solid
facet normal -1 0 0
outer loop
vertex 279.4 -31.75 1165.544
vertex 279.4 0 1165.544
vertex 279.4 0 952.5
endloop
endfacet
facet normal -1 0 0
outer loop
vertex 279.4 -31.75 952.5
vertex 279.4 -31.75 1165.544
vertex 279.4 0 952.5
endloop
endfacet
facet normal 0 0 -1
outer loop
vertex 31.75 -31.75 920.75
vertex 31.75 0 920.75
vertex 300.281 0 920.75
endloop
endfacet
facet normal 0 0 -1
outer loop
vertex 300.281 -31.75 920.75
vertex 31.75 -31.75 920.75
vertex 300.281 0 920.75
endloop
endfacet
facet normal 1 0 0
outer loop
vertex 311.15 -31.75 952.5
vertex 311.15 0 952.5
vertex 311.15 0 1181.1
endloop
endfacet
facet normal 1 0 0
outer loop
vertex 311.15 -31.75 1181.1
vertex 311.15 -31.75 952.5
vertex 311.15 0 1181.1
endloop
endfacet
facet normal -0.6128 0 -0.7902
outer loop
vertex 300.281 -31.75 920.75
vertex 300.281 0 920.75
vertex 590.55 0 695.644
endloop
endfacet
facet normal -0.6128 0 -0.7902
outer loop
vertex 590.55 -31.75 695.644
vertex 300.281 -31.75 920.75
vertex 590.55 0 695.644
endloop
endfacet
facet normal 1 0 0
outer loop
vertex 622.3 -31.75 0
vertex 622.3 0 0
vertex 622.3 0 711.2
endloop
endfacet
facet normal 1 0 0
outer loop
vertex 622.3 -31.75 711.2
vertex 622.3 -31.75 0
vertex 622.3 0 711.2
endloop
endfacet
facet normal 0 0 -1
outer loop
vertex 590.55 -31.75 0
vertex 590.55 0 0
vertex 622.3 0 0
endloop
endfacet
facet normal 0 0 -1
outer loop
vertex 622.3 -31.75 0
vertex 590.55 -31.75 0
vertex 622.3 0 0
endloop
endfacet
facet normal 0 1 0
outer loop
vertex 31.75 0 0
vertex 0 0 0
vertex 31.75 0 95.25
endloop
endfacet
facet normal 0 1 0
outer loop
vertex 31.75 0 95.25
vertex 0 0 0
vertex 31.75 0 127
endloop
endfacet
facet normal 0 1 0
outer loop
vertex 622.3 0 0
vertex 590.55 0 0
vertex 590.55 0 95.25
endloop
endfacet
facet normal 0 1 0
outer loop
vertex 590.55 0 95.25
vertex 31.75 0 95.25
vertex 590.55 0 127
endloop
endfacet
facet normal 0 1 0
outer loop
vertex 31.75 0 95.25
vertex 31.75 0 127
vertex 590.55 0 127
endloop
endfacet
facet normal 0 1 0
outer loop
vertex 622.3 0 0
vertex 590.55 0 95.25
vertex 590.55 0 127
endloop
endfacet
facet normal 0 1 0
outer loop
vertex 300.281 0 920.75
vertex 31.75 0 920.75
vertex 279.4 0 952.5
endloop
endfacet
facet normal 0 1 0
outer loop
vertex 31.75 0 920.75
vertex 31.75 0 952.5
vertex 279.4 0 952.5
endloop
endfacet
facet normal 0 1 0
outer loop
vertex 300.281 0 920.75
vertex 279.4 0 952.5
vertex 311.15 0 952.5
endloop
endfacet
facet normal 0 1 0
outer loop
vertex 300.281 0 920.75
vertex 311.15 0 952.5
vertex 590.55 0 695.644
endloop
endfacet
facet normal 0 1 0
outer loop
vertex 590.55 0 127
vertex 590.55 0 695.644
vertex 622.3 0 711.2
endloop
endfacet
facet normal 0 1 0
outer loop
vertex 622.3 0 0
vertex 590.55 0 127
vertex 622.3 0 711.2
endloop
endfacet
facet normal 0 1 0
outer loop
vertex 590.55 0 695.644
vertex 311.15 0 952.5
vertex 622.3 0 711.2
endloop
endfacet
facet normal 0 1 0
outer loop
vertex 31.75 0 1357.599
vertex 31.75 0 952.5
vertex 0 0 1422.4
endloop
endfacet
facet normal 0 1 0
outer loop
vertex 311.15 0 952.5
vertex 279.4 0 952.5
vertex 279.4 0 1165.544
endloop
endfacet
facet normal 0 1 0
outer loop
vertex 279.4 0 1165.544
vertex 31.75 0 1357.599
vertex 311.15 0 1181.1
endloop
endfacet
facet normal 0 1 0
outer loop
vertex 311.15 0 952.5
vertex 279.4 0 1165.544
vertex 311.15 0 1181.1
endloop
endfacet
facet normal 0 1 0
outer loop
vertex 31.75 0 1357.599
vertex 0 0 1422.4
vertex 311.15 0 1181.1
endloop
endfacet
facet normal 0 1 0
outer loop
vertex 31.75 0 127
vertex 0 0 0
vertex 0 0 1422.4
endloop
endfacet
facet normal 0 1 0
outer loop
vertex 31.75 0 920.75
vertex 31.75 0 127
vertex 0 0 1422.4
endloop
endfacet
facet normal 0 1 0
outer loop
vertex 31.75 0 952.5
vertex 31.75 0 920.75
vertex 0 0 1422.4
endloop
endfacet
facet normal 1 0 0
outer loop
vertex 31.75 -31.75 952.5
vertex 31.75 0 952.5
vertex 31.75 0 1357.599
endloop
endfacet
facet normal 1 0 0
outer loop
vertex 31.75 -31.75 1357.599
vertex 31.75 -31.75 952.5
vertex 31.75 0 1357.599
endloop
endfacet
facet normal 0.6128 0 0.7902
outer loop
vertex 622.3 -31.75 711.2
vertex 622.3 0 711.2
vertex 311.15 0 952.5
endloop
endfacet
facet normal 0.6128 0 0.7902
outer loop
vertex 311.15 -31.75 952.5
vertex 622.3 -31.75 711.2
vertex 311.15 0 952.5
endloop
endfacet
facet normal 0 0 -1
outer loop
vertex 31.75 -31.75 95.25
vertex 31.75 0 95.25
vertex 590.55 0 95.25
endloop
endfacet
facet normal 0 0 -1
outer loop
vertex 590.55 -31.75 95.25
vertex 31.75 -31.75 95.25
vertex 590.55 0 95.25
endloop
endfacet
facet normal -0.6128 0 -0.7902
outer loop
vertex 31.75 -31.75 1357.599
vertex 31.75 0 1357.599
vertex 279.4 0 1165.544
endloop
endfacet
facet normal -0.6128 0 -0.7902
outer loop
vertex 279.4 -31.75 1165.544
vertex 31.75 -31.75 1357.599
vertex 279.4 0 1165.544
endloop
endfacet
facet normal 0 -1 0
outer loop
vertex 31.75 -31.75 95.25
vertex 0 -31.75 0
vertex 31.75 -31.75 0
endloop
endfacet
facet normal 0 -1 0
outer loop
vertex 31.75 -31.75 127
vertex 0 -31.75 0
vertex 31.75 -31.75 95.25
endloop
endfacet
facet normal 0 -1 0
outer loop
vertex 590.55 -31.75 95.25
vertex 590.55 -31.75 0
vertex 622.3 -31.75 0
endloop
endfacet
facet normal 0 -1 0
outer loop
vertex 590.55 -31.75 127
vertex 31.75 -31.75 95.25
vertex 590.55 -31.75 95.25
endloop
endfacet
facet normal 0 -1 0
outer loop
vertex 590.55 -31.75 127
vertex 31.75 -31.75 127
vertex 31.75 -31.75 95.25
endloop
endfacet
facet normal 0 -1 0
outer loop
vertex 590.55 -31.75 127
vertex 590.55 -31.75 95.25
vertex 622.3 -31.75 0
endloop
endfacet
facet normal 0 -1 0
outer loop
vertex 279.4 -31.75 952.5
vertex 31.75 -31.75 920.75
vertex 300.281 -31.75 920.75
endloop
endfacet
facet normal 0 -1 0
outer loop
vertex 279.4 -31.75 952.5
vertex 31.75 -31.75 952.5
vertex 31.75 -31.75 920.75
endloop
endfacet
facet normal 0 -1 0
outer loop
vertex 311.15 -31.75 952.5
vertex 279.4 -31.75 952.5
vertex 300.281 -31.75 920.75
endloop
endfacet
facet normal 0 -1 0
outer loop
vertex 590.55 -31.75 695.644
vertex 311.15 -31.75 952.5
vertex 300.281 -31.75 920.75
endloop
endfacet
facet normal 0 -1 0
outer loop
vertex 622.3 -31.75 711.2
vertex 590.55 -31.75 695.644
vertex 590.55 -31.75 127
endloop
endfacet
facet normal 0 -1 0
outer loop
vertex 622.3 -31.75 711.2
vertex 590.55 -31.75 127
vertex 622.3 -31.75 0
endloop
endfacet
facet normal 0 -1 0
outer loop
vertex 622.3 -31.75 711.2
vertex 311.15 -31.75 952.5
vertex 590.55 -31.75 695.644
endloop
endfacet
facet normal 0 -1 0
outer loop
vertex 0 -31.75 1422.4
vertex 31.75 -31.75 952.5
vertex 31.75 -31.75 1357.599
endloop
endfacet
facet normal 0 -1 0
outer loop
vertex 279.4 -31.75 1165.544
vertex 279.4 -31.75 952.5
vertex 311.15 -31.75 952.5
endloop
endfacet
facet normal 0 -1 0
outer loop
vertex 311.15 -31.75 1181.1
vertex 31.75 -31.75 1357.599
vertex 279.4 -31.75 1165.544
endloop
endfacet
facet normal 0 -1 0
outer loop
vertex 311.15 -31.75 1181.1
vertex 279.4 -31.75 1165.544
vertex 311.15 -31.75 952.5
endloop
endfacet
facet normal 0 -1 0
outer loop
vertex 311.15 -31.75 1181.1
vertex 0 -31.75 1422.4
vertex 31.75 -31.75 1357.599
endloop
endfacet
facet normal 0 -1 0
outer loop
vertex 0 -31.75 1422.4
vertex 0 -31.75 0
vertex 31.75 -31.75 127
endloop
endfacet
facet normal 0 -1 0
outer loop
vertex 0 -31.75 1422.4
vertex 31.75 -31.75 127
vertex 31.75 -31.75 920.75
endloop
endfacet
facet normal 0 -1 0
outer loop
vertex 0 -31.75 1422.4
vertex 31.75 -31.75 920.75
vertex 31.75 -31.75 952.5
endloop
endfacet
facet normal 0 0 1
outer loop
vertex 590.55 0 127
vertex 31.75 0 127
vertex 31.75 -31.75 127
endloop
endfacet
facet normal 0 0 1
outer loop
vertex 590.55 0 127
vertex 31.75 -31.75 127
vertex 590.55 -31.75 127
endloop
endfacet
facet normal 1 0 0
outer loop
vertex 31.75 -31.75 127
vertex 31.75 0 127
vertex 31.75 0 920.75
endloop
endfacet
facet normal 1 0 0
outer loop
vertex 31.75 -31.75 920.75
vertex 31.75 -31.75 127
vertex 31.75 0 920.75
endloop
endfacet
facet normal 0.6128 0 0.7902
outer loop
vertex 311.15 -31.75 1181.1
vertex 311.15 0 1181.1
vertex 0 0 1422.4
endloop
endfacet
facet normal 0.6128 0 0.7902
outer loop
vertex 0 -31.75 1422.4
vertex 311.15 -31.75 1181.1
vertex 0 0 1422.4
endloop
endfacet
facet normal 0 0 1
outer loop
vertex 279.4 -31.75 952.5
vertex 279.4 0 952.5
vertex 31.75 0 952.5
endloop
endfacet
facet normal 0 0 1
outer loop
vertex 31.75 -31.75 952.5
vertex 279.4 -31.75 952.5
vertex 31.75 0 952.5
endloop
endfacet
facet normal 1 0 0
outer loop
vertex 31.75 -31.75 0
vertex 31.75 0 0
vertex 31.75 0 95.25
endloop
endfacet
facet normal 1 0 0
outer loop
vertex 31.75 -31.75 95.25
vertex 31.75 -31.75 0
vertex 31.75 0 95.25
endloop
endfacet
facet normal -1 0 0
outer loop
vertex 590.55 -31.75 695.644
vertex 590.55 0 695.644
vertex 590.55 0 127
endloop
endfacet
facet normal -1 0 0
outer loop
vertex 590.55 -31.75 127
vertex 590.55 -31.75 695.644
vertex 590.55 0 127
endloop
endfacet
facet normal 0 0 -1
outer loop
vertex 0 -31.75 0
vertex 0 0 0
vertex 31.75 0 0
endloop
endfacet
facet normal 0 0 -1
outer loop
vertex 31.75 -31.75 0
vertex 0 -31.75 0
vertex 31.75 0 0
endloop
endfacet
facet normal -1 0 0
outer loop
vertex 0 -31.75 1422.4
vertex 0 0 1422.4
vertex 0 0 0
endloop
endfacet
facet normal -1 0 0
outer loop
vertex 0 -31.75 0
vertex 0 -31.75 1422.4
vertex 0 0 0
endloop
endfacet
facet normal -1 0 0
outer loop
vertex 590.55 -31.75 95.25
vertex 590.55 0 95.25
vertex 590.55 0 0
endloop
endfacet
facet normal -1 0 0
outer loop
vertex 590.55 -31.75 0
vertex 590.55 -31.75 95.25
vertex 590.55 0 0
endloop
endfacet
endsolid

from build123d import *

# Parameters (mm, degrees)
F0_W     = 558.8
F0_H     = 31.75
F1_DEPTH = 31.75


with BuildPart() as f1:
    # F0 (on Front) → F1 (new body)
    with BuildSketch(Plane.XZ):
        Polygon((0, 711.2), (0, 0), (31.75, 0), (31.75, 95.25), (31.75, 127), (31.75, 920.75), (31.75, 952.5), (31.75, 1357.598856), (279.4, 1165.543754), (279.4, 952.5), (311.15, 952.5), (311.15, 1181.1), (0, 1422.4), (0, 952.5), align=None)
        Polygon((590.55, 127), (590.55, 95.25), (590.55, 0), (622.3, 0), (622.3, 711.2), (311.15, 952.5), (279.4, 952.5), (31.75, 952.5), (31.75, 920.75), (300.28142, 920.75), (590.55, 695.643754), align=None)
        with Locations((311.15, 111.125)):
            Rectangle(F0_W, F0_H)
    extrude(amount=F1_DEPTH)


solid = f1.part
